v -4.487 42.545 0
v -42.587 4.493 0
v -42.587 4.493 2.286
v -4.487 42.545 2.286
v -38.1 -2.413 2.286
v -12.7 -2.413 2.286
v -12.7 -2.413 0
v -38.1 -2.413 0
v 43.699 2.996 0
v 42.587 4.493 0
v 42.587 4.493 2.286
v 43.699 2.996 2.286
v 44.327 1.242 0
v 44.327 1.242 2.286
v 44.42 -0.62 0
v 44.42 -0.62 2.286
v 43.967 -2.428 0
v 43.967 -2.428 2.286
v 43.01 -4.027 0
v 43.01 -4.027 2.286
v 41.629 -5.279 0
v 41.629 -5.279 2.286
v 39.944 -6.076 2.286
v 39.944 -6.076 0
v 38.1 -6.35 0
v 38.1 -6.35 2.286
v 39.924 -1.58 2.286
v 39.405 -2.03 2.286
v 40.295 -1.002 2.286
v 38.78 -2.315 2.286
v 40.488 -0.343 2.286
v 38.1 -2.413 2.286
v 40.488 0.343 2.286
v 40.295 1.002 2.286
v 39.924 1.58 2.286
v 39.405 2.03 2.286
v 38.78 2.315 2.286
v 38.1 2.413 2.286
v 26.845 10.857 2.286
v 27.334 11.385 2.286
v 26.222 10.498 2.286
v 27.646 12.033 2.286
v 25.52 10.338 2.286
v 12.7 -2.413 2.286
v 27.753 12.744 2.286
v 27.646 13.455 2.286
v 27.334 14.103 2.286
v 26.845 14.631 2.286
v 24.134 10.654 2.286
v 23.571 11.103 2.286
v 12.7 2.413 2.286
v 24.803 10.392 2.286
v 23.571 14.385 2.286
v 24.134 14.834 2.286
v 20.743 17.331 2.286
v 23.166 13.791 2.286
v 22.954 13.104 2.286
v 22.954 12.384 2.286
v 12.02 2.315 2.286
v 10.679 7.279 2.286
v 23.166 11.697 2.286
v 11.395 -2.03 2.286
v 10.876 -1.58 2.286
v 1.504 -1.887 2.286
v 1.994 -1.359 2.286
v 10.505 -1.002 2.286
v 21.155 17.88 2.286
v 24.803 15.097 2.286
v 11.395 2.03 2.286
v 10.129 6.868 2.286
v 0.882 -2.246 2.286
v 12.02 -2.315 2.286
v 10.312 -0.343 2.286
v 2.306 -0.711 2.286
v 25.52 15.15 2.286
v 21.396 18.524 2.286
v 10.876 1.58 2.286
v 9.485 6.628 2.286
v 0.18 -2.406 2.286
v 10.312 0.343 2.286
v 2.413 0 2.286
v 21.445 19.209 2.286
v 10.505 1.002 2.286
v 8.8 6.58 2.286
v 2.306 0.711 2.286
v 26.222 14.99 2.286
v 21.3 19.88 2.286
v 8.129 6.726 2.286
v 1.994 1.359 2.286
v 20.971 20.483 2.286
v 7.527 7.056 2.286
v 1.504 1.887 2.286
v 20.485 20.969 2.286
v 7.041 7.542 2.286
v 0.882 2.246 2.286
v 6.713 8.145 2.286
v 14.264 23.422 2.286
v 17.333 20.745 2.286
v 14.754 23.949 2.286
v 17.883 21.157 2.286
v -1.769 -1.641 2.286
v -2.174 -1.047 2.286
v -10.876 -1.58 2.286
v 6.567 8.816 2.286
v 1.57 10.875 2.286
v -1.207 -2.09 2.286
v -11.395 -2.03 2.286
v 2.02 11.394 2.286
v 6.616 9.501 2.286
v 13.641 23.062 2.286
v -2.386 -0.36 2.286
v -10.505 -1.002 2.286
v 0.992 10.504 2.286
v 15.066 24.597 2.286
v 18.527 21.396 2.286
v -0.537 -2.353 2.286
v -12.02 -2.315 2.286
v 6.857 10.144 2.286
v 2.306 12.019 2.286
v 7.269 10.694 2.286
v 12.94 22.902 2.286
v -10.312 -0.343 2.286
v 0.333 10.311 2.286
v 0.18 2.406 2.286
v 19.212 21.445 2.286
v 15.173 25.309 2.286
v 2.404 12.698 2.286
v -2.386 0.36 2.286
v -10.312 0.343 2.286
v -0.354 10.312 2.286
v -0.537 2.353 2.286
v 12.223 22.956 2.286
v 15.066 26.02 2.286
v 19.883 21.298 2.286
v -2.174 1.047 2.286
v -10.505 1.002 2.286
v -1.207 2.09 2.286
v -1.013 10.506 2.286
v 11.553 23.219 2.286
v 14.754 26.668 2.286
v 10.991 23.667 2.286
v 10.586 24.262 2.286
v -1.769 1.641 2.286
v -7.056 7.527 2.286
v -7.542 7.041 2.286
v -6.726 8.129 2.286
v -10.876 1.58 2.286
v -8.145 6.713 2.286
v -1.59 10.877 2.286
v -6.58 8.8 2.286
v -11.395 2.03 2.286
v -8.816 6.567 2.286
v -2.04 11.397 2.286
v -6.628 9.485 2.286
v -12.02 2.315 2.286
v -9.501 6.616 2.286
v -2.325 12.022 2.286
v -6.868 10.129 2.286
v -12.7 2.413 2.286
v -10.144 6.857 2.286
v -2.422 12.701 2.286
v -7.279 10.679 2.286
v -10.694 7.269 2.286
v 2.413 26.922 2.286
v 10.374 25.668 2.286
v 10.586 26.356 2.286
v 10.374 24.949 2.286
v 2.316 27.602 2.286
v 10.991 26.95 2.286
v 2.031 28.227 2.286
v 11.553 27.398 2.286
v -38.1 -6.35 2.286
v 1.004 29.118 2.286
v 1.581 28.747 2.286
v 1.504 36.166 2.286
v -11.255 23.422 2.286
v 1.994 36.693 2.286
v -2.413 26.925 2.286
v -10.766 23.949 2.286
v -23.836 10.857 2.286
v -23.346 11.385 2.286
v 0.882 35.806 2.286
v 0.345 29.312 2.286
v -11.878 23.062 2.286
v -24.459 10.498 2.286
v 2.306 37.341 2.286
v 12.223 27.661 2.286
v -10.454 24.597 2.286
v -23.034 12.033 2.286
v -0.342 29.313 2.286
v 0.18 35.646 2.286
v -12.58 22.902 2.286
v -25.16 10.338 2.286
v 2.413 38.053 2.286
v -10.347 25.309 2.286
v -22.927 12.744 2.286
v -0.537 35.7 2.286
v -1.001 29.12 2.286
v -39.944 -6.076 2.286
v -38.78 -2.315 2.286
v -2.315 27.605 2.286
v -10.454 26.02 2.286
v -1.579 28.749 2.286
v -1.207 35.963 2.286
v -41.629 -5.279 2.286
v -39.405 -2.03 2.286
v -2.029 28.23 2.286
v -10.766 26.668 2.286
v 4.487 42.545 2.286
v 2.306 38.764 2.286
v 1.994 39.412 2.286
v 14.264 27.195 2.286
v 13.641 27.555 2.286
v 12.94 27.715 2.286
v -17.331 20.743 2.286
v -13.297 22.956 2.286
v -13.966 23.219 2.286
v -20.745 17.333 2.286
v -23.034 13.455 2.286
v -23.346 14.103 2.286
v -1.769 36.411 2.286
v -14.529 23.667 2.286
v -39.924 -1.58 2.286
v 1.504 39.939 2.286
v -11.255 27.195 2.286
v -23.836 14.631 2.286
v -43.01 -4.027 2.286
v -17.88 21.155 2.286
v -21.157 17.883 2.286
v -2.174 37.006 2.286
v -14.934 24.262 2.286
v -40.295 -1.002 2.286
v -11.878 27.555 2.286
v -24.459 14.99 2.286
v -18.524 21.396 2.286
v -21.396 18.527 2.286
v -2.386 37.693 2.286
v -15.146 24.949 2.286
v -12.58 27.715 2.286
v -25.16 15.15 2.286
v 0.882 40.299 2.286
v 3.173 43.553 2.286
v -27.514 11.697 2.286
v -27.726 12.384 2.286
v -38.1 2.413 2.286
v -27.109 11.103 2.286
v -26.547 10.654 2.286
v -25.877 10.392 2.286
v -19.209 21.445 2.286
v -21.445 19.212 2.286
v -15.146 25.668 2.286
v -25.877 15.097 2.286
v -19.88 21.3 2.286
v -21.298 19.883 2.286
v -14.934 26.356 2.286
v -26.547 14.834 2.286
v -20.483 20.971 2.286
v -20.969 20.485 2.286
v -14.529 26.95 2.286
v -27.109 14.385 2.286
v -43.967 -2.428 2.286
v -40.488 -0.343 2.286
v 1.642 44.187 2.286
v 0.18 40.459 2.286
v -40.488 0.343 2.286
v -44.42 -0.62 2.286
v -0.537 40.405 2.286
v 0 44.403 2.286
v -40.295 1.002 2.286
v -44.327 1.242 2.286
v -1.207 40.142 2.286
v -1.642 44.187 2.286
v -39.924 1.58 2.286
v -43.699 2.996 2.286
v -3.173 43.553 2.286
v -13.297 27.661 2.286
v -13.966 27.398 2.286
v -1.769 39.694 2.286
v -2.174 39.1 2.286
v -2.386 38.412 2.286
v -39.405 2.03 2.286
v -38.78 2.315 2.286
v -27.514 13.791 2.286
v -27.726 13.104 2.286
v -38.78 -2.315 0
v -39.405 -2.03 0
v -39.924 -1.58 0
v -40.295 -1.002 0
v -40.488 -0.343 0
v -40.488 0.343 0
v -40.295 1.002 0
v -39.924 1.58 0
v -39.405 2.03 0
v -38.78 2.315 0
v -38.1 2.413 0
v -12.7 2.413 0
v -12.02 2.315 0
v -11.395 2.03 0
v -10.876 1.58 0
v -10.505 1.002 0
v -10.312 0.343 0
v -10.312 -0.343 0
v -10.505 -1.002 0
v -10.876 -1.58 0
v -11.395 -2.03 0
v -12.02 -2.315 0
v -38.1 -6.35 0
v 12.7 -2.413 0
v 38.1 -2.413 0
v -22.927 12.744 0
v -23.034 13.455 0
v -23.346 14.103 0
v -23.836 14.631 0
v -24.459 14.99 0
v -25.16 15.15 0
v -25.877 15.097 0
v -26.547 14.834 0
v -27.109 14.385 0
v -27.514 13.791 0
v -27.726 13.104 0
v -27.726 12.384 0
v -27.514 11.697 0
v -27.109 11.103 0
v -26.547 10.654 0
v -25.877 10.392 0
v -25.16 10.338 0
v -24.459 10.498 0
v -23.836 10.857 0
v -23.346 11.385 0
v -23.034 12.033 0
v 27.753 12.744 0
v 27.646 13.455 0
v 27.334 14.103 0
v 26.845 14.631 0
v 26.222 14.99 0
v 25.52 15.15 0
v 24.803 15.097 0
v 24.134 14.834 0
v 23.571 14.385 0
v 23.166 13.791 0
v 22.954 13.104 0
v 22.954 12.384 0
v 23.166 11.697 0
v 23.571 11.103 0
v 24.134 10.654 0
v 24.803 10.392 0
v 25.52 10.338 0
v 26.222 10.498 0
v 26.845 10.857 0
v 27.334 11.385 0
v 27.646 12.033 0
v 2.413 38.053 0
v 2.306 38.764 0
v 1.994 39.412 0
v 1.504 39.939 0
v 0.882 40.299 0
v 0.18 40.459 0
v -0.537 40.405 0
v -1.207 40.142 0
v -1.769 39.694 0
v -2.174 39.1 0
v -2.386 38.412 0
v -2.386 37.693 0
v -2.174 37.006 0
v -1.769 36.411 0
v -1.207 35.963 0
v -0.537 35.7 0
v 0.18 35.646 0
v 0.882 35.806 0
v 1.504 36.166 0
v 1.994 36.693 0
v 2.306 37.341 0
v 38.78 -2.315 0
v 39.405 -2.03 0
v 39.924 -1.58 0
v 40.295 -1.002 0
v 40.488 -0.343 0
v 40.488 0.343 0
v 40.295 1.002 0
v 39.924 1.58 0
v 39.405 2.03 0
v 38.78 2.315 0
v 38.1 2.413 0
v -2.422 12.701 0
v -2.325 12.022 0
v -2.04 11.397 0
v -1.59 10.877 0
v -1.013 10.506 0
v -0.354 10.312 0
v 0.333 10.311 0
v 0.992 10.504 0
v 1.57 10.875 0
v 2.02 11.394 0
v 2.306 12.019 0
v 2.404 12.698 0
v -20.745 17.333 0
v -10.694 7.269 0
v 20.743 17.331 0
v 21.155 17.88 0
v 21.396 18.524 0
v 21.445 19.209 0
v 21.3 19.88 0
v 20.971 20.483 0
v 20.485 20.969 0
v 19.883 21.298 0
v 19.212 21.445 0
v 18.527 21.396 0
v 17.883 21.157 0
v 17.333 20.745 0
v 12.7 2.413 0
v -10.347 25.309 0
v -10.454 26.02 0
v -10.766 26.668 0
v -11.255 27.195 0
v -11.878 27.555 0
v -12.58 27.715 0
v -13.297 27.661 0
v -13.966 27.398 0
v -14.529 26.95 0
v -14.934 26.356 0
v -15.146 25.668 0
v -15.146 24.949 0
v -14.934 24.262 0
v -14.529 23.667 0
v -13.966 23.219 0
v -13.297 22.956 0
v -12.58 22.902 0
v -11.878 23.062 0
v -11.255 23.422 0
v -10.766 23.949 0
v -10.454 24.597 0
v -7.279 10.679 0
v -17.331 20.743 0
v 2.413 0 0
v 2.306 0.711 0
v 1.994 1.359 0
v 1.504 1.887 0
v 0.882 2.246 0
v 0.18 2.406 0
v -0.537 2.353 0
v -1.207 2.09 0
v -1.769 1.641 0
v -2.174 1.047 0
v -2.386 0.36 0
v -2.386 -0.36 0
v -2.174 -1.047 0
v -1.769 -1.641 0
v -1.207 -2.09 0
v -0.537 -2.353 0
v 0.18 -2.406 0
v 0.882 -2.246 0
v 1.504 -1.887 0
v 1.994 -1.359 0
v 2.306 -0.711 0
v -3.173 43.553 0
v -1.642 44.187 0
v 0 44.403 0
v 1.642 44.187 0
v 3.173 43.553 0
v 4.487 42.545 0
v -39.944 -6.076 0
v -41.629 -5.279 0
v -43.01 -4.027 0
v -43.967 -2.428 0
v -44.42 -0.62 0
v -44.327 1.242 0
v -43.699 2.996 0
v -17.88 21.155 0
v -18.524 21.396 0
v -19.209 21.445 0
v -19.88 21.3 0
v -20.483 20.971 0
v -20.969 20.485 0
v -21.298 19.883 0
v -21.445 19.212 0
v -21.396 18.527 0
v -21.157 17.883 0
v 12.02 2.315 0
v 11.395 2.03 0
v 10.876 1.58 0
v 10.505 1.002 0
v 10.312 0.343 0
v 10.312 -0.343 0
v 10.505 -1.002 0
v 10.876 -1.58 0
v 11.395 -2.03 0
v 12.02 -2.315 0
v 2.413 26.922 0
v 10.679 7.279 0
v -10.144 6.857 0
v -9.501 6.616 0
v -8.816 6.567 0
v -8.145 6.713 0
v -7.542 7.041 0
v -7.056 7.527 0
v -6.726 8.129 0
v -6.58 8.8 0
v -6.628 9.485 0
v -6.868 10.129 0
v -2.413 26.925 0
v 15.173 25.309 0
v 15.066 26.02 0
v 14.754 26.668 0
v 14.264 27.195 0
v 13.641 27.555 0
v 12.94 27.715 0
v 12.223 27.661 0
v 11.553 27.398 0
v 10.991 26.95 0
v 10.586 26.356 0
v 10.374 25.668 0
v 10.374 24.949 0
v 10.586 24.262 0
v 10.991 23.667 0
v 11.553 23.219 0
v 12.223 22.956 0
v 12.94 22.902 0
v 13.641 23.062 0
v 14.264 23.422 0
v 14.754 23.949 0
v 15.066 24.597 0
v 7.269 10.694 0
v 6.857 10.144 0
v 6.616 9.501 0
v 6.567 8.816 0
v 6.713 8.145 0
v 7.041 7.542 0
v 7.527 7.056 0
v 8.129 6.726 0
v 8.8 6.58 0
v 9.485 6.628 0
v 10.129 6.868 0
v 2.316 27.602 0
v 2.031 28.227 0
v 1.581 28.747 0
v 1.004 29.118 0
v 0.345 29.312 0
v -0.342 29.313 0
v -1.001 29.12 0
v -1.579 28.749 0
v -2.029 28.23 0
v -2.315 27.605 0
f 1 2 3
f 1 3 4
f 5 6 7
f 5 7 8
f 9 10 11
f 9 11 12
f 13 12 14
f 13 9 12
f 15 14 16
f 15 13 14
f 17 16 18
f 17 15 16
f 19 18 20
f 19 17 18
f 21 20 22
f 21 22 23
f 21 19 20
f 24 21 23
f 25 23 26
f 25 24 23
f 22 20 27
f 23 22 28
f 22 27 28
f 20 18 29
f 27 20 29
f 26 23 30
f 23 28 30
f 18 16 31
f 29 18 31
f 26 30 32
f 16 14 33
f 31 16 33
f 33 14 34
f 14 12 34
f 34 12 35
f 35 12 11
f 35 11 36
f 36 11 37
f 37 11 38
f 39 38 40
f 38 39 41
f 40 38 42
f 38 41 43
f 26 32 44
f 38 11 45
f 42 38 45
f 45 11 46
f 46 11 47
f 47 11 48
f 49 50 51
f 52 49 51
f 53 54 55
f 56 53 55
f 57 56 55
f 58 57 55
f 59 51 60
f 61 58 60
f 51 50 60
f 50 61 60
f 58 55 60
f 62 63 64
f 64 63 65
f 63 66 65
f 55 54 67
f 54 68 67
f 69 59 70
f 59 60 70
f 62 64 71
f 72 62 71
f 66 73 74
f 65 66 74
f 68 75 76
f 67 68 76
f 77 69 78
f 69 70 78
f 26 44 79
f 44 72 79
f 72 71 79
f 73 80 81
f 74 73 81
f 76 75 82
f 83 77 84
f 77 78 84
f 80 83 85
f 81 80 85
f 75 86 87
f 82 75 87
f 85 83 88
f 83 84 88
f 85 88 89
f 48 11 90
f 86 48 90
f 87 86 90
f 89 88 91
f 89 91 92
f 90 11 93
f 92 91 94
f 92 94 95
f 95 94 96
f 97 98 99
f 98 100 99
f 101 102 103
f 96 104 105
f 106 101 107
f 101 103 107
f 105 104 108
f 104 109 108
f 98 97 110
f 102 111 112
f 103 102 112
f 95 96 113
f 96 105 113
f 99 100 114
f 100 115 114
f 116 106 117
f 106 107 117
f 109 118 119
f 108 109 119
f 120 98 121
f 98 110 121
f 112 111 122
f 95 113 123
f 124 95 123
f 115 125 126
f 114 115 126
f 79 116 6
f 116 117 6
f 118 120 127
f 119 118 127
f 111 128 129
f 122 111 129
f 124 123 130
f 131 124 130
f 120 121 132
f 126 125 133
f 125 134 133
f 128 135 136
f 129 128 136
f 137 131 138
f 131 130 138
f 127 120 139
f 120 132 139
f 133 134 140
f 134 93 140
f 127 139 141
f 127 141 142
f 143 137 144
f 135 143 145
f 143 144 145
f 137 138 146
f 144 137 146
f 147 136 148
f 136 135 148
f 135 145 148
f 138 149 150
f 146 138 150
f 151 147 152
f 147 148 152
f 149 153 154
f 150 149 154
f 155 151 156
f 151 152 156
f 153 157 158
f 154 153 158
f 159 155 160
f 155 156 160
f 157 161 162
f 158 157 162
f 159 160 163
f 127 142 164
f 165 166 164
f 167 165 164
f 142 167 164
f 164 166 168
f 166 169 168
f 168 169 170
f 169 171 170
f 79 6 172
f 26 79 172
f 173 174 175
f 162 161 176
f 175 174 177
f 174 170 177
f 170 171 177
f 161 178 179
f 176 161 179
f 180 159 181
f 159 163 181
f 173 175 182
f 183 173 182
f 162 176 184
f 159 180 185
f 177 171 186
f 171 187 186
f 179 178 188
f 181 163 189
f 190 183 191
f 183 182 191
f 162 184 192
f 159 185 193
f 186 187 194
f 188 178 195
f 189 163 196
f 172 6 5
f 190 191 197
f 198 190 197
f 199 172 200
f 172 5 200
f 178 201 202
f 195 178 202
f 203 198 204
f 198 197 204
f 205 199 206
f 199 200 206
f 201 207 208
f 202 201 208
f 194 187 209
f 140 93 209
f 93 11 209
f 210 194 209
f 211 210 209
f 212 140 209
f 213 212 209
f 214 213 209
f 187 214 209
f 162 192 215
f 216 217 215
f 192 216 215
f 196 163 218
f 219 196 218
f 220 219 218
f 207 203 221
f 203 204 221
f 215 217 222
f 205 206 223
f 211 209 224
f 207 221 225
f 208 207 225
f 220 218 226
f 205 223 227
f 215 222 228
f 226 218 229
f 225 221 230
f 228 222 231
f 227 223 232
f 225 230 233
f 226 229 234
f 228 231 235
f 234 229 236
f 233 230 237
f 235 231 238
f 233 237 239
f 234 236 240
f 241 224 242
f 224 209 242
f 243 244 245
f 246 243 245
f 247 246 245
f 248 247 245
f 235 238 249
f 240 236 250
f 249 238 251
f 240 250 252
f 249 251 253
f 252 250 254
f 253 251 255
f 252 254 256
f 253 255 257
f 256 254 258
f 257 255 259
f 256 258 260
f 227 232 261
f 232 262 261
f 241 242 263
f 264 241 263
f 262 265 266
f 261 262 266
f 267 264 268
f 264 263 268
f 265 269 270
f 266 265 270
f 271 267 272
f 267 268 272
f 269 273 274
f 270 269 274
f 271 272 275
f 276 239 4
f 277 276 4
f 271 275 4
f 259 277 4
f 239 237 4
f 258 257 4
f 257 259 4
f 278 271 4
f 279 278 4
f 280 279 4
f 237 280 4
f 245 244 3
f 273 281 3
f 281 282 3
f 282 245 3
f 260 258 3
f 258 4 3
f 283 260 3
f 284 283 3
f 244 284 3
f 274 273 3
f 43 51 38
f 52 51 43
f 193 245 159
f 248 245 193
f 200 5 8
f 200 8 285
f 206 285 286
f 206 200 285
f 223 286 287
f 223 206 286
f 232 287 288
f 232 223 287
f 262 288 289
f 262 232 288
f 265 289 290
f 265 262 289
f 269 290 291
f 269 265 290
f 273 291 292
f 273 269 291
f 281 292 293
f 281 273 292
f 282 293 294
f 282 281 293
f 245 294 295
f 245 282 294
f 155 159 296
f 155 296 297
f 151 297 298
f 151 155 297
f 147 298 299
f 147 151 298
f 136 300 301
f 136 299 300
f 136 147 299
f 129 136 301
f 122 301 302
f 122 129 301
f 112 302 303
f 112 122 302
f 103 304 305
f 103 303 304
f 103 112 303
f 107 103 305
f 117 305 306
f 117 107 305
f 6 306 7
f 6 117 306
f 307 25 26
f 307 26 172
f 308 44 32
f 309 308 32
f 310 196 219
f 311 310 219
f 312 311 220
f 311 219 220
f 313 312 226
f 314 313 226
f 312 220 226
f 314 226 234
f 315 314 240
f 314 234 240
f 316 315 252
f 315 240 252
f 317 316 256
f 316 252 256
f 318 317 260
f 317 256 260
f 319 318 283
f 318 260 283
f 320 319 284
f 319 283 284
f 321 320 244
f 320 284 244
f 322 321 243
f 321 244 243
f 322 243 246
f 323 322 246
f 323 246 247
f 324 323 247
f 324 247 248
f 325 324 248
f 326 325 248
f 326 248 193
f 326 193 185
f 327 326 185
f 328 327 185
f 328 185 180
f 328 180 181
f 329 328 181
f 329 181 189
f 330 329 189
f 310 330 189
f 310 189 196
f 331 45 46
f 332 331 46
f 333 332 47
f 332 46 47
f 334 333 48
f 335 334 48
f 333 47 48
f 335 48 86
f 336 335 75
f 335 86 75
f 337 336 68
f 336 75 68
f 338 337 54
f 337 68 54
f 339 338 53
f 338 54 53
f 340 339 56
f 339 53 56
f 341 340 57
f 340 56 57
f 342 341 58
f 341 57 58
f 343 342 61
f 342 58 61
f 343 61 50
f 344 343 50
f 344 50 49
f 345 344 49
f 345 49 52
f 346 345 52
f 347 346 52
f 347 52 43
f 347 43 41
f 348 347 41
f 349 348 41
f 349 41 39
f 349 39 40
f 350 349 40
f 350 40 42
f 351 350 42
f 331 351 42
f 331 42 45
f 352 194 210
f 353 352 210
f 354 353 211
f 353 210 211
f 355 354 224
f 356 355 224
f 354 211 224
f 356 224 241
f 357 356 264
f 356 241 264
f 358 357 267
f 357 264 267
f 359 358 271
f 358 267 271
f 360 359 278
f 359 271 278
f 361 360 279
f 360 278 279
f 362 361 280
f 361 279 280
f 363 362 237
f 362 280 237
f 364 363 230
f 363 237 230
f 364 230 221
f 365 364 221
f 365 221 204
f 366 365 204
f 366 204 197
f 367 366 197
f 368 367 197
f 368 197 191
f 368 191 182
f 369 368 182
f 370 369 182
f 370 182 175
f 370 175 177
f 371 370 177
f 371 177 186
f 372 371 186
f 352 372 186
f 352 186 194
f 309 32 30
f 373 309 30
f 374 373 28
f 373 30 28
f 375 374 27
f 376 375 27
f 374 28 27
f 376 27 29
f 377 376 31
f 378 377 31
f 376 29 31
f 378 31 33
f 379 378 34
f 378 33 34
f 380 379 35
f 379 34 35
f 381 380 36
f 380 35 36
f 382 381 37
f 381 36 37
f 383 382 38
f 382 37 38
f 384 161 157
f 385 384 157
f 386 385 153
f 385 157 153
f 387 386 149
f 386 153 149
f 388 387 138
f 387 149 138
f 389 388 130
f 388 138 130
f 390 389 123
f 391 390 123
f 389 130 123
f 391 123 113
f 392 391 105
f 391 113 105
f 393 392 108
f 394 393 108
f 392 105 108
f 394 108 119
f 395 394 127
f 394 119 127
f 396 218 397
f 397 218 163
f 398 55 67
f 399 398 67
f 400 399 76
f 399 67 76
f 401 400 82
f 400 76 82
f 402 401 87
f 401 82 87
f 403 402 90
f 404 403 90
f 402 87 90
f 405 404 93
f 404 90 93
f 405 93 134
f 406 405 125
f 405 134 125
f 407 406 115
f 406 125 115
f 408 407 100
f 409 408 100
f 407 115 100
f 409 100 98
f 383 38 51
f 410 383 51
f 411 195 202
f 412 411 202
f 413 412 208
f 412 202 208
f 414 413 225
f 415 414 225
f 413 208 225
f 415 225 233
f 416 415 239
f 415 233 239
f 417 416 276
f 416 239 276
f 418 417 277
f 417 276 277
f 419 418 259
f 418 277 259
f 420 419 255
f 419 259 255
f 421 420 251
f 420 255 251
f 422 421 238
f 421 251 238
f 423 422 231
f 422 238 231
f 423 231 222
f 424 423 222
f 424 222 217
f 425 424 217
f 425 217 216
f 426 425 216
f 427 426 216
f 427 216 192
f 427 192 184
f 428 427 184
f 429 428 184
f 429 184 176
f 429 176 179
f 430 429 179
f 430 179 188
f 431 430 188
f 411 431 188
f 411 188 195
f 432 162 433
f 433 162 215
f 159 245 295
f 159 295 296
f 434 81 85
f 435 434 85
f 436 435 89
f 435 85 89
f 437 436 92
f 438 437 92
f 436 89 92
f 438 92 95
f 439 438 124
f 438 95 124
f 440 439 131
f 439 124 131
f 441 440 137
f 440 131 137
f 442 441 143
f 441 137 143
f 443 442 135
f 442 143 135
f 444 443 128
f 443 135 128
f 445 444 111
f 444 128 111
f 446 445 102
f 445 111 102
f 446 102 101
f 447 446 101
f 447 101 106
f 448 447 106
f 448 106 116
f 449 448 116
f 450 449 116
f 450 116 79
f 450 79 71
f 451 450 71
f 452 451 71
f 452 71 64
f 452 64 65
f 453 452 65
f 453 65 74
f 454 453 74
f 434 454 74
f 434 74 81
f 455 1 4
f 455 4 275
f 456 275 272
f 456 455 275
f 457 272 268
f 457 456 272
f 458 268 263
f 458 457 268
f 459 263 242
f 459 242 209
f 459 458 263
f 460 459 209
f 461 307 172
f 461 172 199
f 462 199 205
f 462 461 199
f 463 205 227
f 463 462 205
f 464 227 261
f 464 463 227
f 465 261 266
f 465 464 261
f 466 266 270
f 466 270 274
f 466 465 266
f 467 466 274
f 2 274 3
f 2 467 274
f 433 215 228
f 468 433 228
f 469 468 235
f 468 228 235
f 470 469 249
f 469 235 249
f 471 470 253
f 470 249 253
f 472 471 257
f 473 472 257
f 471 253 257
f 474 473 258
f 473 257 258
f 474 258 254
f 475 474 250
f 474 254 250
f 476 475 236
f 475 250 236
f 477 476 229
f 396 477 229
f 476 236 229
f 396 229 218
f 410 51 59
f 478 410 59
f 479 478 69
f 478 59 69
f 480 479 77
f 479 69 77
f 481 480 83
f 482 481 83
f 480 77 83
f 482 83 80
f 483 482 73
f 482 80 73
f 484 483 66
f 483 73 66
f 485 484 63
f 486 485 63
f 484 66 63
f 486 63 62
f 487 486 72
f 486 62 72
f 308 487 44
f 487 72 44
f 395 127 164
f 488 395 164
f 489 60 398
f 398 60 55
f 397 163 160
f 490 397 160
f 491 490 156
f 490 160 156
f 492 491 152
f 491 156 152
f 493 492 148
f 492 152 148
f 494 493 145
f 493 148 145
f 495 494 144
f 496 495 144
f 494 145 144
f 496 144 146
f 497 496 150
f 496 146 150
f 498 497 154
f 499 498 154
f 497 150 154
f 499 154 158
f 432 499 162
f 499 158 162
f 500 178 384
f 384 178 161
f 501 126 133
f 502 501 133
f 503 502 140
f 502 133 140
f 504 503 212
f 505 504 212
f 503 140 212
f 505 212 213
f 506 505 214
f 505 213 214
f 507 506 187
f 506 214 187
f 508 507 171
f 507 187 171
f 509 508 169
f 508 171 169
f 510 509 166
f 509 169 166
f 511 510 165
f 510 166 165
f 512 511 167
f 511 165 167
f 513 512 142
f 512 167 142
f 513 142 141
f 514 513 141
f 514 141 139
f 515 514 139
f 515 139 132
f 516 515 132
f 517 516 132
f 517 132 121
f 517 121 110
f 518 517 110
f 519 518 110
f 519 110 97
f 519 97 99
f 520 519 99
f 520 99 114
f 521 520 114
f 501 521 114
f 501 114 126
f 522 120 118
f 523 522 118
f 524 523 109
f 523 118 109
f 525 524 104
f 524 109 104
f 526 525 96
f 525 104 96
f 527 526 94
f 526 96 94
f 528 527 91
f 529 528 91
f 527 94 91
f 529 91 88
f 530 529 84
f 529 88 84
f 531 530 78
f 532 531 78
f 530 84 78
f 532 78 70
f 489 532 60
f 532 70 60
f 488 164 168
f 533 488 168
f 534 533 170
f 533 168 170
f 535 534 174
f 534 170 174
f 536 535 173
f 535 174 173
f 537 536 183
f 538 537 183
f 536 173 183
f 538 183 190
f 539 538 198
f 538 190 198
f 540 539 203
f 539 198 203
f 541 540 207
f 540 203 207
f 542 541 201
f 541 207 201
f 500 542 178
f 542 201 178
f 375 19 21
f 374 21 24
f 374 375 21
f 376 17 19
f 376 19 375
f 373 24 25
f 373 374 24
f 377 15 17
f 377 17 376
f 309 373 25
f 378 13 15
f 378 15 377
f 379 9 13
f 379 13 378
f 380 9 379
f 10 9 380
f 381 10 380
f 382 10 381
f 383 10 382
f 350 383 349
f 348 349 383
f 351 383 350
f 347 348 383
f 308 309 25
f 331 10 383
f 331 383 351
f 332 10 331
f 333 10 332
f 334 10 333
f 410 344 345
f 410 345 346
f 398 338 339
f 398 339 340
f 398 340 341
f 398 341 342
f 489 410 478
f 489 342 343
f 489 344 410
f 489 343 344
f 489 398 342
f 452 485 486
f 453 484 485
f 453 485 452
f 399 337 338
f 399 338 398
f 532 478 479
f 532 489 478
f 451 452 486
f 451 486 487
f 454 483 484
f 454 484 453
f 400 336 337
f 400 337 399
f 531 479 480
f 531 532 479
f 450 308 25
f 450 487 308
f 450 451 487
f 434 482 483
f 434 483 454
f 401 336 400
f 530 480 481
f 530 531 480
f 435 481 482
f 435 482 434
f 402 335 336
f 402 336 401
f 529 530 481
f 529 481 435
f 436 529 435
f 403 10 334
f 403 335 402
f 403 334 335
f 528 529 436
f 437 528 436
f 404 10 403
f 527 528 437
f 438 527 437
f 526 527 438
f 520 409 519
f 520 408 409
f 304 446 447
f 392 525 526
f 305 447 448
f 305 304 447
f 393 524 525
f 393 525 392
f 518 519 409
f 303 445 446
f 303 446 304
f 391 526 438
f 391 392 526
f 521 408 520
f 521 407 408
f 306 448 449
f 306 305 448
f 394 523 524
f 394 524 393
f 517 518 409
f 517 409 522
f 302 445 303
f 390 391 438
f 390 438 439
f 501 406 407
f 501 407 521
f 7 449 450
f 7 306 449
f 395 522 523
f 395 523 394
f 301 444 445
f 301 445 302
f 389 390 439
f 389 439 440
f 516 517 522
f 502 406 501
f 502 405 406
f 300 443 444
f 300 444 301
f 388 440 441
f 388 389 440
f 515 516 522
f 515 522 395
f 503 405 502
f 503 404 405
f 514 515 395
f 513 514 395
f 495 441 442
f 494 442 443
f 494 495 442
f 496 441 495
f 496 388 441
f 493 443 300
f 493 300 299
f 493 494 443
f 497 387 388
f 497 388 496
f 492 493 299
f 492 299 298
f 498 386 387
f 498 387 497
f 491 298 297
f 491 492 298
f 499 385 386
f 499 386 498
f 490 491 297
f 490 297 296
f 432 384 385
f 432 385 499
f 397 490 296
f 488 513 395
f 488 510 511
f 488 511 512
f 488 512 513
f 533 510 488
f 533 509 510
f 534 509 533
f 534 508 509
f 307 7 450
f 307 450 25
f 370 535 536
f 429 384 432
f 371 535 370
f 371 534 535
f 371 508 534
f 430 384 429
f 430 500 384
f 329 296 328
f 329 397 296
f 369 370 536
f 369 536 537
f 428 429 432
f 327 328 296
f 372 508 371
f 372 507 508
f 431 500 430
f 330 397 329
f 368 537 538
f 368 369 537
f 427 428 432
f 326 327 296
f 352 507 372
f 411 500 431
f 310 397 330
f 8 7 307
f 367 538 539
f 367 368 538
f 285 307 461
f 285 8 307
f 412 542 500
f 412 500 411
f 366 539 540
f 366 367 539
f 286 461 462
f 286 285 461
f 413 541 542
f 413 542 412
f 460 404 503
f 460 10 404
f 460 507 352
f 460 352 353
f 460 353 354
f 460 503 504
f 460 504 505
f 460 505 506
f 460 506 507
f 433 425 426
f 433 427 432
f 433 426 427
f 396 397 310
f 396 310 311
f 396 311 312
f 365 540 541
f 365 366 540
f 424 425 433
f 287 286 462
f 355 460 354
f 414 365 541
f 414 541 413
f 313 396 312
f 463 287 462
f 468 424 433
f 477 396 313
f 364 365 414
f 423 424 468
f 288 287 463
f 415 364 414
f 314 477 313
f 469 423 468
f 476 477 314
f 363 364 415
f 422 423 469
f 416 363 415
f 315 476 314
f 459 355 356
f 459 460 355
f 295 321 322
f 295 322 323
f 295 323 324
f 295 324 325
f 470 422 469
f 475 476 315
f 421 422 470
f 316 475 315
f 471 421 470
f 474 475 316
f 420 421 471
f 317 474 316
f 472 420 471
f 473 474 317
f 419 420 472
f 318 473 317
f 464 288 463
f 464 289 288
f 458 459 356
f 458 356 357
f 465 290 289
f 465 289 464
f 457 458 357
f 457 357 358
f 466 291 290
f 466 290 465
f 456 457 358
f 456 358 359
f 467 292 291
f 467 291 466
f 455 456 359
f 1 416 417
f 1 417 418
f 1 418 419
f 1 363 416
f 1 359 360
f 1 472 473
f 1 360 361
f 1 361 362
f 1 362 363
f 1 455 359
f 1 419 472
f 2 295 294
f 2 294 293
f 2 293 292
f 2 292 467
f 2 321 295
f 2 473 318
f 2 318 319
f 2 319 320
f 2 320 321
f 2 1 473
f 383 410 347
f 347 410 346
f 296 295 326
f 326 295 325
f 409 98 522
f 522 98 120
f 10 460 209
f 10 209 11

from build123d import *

# Parameters (mm, degrees)
BOSS_EXTRUDE1_DEPTH = 2.286
SKETCH2_R           = 2.413
CUT_EXTRUDE1_DEPTH  = 3.286
CUT_EXTRUDE2_DEPTH  = 3.286
CUT_EXTRUDE3_DEPTH  = 3.286
CIRPATTERN1_COUNT   = 3
CIRPATTERN1_ANGLE   = 90


with BuildPart() as part:
    # Sketch1 → Boss-Extrude1 (new body)
    with BuildSketch(Plane.XY):
        with BuildLine():
            Line((-42.58732985, 4.492924528), (-4.48732985, 42.545481657))
            ThreePointArc((-4.48732985, 42.545481657), (0, 44.402557128), (4.48732985, 42.545481657))
            Line((4.48732985, 42.545481657), (42.58732985, 4.492924528))
            ThreePointArc((42.58732985, 4.492924528), (43.967391701, -2.428212228), (38.1, -6.35))
            Line((38.1, -6.35), (-38.1, -6.35))
            ThreePointArc((-38.1, -6.35), (-43.967391701, -2.428212228), (-42.58732985, 4.492924528))
        make_face()
    extrude(amount=BOSS_EXTRUDE1_DEPTH)

    # Sketch2 → Cut-Extrude1 (cut, through all)
    with BuildSketch(Plane.XY.offset(2.286)):
        Circle(SKETCH2_R)
        with Locations((0, 38.052557128)):
            Circle(SKETCH2_R)
        with Locations((-25.34009434, 12.744016774)):
            Circle(SKETCH2_R)
        with Locations((25.34009434, 12.744016774)):
            Circle(SKETCH2_R)
        with Locations((-12.75990566, 25.308540354)):
            Circle(SKETCH2_R)
        with Locations((12.75990566, 25.308540354)):
            Circle(SKETCH2_R)
    extrude(amount=-CUT_EXTRUDE1_DEPTH, mode=Mode.SUBTRACT)

    # Sketch3 → Cut-Extrude2 (cut, through all)
    with BuildSketch(Plane.XY.offset(2.286)):
        with BuildLine():
            Line((-38.1, 2.413), (-12.7, 2.413))
            ThreePointArc((-12.7, 2.413), (-10.287, 0), (-12.7, -2.413))
            Line((-12.7, -2.413), (-38.1, -2.413))
            ThreePointArc((-38.1, -2.413), (-40.513, 0), (-38.1, 2.413))
        make_face()
    cut_extrude2 = extrude(amount=-CUT_EXTRUDE2_DEPTH, mode=Mode.SUBTRACT)

    # Mirror1: Cut-Extrude2 across plane
    add(cut_extrude2.mirror(Plane(origin=(0, 0, 0), x_dir=(0, 0, 1), z_dir=(1, 0, 0))), mode=Mode.SUBTRACT)

    # Sketch4 → Cut-Extrude3 (cut, through all)
    with BuildSketch(Plane.XY.offset(2.286)):
        with BuildLine():
            Line((-20.745443214, 17.33294655), (-10.69382435, 7.268795606))
            ThreePointArc((-10.69382435, 7.268795606), (-7.281327686, 7.266669629), (-7.279201708, 10.679166292))
            Line((-7.279201708, 10.679166292), (-17.330820572, 20.743317236))
            ThreePointArc((-17.330820572, 20.743317236), (-20.743317236, 20.745443214), (-20.745443214, 17.33294655))
        make_face()
    cut_extrude3 = extrude(amount=-CUT_EXTRUDE3_DEPTH, mode=Mode.SUBTRACT)

    # CirPattern1: Cut-Extrude3 ×3 about axis
    cirpattern1_axis = Axis((0, 0, 0), (0, 0, -1))
    for i in range(1, CIRPATTERN1_COUNT):
        add(cut_extrude3.rotate(cirpattern1_axis, i * CIRPATTERN1_ANGLE / (CIRPATTERN1_COUNT - 1)), mode=Mode.SUBTRACT)


solid = part.part
